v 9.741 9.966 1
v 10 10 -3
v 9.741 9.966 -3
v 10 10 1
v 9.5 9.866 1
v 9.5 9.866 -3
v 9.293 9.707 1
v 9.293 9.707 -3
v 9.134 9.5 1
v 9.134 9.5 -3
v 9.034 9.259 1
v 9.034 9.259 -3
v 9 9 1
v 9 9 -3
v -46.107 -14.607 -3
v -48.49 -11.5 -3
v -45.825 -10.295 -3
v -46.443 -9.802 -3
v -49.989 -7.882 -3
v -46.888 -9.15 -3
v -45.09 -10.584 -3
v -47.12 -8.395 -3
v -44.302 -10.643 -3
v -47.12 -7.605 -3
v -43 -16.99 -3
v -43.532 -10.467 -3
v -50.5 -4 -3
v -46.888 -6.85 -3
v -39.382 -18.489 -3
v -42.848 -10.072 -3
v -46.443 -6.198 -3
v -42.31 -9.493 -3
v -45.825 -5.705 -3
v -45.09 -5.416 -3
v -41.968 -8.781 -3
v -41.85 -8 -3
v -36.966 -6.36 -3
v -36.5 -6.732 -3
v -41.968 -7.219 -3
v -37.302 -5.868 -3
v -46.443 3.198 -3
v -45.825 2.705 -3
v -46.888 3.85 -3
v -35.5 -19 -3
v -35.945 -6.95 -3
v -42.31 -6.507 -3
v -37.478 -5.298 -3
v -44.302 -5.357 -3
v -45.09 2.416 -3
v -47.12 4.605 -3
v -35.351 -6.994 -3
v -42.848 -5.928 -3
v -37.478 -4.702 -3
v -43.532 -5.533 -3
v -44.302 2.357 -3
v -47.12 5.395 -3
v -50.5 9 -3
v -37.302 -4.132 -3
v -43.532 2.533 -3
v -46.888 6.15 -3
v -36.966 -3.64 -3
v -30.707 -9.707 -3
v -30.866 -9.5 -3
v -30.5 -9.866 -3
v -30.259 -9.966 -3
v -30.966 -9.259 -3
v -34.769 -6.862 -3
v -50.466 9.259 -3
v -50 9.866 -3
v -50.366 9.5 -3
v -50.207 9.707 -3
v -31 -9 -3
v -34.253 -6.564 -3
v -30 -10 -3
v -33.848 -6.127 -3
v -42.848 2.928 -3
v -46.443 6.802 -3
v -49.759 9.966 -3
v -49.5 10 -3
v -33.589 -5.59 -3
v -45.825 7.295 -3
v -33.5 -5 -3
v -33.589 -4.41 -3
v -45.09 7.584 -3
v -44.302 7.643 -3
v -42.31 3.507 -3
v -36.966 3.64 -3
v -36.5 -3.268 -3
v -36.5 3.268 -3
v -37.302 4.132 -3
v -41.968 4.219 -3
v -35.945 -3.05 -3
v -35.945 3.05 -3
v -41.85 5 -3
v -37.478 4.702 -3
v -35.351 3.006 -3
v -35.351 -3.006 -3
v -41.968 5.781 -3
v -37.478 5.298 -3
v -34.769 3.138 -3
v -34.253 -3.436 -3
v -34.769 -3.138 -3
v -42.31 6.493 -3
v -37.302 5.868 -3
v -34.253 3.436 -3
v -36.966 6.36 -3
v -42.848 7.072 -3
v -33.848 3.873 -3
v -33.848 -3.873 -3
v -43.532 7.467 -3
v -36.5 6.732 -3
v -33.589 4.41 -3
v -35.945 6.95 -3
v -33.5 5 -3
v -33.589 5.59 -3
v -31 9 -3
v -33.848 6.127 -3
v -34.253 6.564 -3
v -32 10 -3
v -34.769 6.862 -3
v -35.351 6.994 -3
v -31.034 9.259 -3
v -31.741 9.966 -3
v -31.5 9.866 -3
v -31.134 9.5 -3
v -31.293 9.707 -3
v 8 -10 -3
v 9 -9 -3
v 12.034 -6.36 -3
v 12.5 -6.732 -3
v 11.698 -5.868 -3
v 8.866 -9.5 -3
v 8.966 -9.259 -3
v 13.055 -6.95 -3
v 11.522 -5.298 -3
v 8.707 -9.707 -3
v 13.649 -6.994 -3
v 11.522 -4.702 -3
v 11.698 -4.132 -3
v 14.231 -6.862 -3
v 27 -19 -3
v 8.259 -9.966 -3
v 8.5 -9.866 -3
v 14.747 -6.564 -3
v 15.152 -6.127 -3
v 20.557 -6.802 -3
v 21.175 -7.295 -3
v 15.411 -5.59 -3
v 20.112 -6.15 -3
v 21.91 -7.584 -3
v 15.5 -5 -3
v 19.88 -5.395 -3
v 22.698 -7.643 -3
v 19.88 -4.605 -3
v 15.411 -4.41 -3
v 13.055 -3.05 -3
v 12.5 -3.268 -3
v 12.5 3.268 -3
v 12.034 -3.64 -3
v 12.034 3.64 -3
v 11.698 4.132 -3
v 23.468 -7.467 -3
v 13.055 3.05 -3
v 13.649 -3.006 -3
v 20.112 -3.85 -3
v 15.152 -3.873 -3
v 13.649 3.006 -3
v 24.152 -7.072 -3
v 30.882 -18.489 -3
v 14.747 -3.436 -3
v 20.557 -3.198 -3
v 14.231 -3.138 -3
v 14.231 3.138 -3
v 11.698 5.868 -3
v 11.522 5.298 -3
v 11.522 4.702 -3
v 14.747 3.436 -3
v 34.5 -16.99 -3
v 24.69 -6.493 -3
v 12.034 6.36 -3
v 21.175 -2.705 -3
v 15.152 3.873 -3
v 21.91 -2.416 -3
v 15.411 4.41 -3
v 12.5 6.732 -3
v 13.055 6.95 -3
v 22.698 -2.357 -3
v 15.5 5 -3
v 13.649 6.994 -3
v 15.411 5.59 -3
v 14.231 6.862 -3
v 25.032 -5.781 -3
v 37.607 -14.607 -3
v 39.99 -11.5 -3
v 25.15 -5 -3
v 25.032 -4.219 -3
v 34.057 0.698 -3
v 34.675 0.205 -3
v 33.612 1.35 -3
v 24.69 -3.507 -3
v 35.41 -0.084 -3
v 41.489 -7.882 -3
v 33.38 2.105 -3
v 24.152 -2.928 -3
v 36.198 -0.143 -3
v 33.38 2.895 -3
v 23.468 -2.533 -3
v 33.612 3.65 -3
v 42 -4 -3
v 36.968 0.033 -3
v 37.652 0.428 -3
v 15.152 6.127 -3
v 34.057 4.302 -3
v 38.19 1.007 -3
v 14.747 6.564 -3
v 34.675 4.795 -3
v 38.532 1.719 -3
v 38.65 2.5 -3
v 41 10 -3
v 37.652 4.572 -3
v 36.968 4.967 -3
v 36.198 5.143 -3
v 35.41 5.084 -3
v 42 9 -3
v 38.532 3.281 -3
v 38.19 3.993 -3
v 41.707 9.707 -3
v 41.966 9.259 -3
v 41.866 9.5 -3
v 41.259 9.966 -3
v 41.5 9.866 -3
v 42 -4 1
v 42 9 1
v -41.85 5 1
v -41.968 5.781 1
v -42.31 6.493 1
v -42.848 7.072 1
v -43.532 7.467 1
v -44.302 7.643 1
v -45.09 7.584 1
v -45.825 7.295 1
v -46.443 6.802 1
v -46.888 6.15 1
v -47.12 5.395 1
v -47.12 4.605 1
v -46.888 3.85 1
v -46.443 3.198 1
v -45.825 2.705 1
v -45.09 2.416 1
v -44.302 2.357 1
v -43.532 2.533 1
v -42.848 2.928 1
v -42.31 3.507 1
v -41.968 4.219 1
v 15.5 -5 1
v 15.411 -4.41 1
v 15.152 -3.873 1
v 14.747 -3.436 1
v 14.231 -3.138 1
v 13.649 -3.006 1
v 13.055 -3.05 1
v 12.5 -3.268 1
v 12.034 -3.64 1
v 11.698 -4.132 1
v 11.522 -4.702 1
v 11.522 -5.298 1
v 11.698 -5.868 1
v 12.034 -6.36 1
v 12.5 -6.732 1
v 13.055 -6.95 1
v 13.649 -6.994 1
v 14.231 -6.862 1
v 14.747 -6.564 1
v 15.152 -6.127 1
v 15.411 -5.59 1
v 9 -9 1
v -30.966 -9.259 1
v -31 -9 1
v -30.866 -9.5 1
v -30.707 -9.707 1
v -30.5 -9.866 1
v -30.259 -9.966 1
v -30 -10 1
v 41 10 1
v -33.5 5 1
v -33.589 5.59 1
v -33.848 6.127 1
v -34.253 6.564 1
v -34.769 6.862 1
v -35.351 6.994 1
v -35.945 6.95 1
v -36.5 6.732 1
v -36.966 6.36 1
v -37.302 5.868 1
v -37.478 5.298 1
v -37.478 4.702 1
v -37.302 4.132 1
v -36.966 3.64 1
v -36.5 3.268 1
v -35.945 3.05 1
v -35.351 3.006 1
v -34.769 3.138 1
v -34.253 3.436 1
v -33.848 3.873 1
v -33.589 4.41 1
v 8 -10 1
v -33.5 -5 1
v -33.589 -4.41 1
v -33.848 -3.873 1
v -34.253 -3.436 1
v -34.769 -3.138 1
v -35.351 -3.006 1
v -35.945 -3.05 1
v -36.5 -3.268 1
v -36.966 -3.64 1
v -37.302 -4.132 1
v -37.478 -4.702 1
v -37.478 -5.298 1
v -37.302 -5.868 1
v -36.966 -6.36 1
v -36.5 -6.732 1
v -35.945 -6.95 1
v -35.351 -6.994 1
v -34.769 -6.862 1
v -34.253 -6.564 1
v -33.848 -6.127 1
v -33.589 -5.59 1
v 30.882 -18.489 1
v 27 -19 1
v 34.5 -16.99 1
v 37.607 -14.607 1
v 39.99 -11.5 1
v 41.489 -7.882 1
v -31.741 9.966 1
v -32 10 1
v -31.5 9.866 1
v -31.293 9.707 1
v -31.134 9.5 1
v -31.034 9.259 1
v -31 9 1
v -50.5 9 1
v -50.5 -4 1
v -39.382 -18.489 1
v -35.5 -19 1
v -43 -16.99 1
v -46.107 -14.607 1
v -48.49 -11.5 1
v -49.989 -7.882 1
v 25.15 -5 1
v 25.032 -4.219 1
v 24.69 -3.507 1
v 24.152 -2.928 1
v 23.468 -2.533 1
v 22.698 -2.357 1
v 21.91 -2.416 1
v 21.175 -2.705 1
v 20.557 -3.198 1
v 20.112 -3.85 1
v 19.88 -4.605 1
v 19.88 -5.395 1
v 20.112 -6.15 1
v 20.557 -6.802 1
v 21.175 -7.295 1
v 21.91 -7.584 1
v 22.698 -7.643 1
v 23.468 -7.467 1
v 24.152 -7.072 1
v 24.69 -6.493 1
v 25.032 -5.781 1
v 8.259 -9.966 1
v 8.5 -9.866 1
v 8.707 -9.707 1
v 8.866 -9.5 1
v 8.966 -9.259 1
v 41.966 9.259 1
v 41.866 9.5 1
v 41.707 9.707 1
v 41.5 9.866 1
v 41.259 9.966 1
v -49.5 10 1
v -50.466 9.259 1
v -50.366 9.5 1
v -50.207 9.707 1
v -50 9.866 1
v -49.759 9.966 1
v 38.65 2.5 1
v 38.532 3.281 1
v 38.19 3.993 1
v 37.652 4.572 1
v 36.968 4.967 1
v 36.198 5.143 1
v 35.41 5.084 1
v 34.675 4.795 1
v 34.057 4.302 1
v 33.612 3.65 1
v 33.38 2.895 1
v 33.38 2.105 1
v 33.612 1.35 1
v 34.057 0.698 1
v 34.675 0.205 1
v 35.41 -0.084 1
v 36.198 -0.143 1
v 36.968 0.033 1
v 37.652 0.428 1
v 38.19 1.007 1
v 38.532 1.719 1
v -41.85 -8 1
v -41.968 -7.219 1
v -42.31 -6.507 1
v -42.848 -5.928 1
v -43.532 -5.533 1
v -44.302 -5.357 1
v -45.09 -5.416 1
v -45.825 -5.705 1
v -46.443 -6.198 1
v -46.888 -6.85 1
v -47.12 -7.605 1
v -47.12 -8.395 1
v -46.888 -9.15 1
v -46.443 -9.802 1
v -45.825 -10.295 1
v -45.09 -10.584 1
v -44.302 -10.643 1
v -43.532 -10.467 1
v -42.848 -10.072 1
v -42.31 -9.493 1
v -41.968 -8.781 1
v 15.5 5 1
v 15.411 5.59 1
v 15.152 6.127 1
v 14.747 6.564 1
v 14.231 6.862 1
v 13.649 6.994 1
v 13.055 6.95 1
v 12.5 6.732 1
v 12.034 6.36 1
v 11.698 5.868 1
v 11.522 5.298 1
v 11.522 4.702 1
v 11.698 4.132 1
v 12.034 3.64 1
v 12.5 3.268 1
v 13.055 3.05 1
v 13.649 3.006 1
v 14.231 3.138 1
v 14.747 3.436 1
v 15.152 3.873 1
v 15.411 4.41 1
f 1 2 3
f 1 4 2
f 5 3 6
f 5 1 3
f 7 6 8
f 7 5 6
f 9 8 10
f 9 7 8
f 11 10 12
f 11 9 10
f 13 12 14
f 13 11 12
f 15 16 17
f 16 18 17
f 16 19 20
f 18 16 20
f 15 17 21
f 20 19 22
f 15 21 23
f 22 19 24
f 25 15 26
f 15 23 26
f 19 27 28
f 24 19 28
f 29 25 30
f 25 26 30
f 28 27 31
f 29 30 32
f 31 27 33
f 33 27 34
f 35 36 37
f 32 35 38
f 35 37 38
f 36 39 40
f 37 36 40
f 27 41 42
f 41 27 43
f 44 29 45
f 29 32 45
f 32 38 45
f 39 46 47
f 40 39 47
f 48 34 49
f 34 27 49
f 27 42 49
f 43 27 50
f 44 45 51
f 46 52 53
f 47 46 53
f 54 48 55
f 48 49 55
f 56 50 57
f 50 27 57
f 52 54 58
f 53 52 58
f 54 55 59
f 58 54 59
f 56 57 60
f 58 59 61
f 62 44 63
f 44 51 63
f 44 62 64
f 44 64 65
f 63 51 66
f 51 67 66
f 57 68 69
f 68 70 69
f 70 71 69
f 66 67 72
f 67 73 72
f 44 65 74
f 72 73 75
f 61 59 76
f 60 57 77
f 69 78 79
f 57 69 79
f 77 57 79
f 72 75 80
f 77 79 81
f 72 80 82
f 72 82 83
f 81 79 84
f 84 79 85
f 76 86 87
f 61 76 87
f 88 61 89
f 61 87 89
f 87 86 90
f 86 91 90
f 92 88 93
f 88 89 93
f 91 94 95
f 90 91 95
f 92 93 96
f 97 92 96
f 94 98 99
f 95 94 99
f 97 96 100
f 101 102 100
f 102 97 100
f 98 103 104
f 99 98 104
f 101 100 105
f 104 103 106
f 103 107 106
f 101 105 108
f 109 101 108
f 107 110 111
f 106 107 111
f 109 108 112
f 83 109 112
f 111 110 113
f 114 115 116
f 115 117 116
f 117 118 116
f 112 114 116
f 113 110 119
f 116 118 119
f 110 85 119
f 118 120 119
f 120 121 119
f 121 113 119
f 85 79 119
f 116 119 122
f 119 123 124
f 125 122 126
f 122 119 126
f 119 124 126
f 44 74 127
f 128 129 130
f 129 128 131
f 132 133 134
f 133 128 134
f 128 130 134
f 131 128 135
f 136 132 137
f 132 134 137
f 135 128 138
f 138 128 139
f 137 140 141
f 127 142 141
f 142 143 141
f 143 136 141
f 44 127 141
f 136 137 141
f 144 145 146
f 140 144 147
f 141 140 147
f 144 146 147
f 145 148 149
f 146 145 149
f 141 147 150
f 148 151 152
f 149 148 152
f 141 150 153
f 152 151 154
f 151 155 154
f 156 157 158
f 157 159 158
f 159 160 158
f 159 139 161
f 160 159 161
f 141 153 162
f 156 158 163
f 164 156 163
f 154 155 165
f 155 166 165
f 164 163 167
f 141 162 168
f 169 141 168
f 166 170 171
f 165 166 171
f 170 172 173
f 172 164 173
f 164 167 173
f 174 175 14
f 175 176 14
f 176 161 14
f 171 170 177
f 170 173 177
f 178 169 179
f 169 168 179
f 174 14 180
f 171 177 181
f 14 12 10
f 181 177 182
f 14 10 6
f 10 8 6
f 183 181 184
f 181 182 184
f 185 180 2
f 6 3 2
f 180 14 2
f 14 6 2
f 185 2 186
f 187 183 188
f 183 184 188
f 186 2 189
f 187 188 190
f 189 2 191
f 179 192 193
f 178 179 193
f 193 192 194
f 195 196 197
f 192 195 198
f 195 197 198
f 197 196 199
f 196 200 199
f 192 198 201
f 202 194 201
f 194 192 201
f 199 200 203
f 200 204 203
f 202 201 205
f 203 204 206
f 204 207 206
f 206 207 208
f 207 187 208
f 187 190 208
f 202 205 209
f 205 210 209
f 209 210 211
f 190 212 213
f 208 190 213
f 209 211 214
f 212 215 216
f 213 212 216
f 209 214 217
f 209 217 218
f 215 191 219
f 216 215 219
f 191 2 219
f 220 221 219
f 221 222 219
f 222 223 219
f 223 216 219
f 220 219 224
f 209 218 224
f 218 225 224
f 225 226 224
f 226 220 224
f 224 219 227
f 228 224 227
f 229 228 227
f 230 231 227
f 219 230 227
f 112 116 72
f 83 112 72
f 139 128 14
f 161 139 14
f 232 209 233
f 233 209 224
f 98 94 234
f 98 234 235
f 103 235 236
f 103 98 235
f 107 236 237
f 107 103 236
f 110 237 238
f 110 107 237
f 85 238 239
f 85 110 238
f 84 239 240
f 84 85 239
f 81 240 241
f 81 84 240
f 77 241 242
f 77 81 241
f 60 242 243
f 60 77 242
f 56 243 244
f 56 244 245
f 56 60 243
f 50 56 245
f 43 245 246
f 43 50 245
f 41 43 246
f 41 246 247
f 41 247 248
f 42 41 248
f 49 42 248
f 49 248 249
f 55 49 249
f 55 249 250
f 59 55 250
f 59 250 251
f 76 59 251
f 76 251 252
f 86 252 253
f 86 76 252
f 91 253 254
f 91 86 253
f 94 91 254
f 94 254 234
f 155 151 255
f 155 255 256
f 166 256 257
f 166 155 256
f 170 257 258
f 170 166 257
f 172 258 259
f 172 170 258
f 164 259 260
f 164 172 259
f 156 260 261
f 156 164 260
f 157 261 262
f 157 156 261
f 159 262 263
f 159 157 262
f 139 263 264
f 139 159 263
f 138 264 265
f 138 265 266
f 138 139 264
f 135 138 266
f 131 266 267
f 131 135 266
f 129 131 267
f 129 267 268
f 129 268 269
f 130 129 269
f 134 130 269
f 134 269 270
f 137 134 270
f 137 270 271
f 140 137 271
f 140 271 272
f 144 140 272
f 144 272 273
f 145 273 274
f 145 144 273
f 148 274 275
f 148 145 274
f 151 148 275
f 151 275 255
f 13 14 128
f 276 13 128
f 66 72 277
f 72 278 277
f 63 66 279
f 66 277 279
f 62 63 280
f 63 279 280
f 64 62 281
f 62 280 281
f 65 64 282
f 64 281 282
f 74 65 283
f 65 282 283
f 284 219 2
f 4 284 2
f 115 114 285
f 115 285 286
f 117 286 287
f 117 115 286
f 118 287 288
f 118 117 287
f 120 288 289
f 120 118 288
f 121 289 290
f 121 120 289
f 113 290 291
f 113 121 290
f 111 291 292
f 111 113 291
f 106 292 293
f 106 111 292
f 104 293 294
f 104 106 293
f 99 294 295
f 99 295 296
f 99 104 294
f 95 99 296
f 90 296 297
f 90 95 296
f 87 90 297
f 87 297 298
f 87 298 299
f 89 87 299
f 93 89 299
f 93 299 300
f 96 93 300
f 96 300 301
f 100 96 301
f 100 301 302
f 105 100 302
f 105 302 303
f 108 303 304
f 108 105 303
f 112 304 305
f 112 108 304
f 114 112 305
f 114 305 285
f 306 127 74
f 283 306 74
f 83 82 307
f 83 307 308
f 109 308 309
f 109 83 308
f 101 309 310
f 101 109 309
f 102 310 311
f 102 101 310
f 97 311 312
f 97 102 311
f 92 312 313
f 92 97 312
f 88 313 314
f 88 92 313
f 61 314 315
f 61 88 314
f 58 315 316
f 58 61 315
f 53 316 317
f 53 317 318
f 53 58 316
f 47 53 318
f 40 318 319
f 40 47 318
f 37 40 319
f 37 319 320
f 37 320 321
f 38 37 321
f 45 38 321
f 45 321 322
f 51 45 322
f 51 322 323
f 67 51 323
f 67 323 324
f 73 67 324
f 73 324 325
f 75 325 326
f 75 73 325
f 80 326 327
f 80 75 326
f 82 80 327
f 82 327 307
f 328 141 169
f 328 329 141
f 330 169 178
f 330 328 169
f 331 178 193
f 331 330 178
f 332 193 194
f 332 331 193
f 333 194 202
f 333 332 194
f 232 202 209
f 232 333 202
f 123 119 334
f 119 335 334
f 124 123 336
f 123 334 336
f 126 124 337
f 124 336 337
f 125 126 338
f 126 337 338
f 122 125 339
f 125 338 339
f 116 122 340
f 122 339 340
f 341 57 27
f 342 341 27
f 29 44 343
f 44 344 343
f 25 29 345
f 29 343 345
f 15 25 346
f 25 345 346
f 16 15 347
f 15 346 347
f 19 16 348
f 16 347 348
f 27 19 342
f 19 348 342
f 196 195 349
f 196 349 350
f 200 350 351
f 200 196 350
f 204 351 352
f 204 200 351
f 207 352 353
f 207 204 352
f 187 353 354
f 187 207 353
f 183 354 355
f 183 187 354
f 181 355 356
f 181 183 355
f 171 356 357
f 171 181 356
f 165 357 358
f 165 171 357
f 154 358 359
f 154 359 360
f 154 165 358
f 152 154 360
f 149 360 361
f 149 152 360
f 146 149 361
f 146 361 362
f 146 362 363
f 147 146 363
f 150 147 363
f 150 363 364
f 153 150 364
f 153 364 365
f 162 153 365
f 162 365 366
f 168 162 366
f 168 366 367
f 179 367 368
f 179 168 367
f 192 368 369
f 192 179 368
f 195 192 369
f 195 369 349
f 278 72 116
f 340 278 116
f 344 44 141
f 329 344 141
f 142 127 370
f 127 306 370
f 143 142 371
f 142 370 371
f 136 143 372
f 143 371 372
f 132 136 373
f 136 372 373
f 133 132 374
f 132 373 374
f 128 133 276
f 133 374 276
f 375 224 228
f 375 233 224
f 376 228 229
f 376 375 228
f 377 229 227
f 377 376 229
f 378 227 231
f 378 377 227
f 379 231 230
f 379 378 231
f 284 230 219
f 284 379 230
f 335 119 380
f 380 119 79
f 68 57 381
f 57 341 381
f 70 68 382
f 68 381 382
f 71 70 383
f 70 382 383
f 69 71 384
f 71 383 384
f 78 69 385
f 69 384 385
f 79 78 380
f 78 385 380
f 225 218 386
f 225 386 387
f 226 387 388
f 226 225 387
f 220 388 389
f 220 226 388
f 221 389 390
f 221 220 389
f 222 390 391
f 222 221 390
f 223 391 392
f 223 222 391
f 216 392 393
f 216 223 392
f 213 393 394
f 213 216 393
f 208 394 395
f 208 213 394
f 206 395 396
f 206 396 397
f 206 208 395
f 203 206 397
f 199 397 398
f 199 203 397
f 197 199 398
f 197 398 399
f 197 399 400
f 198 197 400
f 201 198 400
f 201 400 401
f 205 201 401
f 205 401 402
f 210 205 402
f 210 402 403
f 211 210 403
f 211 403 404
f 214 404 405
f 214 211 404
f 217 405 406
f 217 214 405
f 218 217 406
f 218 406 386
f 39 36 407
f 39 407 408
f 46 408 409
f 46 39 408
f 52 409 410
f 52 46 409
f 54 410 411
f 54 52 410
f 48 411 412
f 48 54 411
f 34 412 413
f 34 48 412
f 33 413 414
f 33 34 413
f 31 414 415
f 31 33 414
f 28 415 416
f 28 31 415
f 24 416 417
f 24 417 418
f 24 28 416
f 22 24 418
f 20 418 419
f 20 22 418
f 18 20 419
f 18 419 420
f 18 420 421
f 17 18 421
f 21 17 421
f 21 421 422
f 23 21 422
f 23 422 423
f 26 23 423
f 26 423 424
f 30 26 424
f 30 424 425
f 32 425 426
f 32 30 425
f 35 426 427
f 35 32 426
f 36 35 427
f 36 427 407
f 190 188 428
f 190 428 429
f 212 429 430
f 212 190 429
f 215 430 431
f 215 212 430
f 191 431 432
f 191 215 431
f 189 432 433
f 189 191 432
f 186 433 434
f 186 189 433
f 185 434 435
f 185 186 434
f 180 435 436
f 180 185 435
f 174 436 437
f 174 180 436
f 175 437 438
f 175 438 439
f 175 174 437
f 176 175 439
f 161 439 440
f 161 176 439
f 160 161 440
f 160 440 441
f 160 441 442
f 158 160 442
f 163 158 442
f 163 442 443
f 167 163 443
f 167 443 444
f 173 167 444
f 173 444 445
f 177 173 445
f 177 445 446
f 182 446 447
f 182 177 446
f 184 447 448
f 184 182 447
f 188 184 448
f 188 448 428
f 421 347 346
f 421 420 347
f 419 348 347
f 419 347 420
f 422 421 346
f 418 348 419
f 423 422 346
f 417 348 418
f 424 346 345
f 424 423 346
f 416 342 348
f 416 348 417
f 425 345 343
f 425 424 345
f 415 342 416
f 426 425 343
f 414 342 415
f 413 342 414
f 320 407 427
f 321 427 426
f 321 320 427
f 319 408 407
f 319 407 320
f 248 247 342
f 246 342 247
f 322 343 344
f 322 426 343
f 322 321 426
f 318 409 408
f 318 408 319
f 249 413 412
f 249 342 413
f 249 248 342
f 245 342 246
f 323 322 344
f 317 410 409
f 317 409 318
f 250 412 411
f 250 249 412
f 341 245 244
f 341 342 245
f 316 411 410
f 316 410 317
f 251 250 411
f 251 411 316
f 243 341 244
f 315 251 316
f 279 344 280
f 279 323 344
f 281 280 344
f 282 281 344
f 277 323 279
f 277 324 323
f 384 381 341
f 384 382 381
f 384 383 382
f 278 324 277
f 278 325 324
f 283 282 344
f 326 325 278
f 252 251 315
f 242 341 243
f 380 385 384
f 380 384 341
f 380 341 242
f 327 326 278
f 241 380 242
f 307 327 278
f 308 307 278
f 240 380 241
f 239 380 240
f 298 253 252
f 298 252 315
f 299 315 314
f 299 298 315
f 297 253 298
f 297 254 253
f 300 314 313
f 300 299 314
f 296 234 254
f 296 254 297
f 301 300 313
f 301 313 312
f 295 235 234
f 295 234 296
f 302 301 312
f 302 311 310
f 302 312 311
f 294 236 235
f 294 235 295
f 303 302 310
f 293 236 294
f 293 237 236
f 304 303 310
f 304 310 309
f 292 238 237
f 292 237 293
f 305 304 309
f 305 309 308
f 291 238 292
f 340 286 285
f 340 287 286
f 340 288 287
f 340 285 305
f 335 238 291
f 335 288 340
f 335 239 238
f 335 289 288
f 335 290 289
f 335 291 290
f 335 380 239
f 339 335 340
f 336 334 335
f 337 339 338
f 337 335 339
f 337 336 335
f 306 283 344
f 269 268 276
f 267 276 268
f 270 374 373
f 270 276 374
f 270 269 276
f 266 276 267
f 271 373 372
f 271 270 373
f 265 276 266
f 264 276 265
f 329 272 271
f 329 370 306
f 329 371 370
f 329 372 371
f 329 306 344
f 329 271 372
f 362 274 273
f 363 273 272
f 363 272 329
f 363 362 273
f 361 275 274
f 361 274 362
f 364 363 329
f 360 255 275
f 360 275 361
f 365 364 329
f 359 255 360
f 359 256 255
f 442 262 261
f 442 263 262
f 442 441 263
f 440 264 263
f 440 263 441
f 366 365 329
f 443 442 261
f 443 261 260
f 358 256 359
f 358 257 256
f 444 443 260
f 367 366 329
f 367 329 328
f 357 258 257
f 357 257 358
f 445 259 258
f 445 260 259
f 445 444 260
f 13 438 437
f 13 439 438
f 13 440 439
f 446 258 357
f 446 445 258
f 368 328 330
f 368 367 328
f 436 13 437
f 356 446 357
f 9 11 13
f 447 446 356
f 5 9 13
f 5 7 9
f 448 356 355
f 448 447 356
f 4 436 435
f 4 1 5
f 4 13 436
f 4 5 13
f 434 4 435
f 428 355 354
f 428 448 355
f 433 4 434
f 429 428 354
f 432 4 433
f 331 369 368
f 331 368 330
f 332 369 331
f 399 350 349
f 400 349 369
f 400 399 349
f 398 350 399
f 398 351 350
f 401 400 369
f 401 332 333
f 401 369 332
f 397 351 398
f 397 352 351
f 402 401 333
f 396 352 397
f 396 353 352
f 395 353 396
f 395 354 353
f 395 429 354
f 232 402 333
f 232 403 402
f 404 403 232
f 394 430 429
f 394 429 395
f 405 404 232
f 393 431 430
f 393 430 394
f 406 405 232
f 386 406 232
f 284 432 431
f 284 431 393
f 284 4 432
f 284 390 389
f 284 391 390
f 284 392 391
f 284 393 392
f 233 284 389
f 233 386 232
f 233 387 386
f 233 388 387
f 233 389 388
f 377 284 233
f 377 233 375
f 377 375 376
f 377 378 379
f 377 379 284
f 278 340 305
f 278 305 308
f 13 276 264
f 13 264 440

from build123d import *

# Parameters (mm, degrees)
SKETCH005_R   = 2
SKETCH005_R_2 = 2.65
PAD_DEPTH     = 4
FILLET_R      = 15
FILLET001_R   = 1
FILLET002_R   = 1


with BuildPart() as part:
    # Sketch005 → Pad (new body)
    with BuildSketch(Plane.XY.offset(-3)):
        Polygon((-50.5, -19), (42, -19), (42, 10), (9, 10), (9, -10), (-31, -10), (-31, 10), (-50.5, 10), align=None)
        with Locations((-35.5, 5)):
            Circle(SKETCH005_R, mode=Mode.SUBTRACT)
        with Locations((-35.5, -5)):
            Circle(SKETCH005_R, mode=Mode.SUBTRACT)
        with Locations((13.5, 5)):
            Circle(SKETCH005_R, mode=Mode.SUBTRACT)
        with Locations((13.5, -5)):
            Circle(SKETCH005_R, mode=Mode.SUBTRACT)
        with Locations((-44.5, -8)):
            Circle(SKETCH005_R_2, mode=Mode.SUBTRACT)
        with Locations((-44.5, 5)):
            Circle(SKETCH005_R_2, mode=Mode.SUBTRACT)
        with Locations((22.5, -5)):
            Circle(SKETCH005_R_2, mode=Mode.SUBTRACT)
        with Locations((36, 2.5)):
            Circle(SKETCH005_R_2, mode=Mode.SUBTRACT)
    extrude(amount=PAD_DEPTH)

    # Fillet
    fillet_edges = [part.edges().sort_by_distance(p)[0] for p in [
        (-50.5, -19, -1),
        (42, -19, -1),
    ]]
    fillet(fillet_edges, radius=FILLET_R)

    # Fillet001
    fillet001_edges = [part.edges().sort_by_distance(p)[0] for p in [
        (42, 10, -1),
        (9, 10, -1),
        (-31, 10, -1),
        (-50.5, 10, -1),
    ]]
    fillet(fillet001_edges, radius=FILLET001_R)

    # Fillet002
    fillet002_edges = [part.edges().sort_by_distance(p)[0] for p in [
        (-31, -10, -1),
        (9, -10, -1),
    ]]
    fillet(fillet002_edges, radius=FILLET002_R)


solid = part.part
